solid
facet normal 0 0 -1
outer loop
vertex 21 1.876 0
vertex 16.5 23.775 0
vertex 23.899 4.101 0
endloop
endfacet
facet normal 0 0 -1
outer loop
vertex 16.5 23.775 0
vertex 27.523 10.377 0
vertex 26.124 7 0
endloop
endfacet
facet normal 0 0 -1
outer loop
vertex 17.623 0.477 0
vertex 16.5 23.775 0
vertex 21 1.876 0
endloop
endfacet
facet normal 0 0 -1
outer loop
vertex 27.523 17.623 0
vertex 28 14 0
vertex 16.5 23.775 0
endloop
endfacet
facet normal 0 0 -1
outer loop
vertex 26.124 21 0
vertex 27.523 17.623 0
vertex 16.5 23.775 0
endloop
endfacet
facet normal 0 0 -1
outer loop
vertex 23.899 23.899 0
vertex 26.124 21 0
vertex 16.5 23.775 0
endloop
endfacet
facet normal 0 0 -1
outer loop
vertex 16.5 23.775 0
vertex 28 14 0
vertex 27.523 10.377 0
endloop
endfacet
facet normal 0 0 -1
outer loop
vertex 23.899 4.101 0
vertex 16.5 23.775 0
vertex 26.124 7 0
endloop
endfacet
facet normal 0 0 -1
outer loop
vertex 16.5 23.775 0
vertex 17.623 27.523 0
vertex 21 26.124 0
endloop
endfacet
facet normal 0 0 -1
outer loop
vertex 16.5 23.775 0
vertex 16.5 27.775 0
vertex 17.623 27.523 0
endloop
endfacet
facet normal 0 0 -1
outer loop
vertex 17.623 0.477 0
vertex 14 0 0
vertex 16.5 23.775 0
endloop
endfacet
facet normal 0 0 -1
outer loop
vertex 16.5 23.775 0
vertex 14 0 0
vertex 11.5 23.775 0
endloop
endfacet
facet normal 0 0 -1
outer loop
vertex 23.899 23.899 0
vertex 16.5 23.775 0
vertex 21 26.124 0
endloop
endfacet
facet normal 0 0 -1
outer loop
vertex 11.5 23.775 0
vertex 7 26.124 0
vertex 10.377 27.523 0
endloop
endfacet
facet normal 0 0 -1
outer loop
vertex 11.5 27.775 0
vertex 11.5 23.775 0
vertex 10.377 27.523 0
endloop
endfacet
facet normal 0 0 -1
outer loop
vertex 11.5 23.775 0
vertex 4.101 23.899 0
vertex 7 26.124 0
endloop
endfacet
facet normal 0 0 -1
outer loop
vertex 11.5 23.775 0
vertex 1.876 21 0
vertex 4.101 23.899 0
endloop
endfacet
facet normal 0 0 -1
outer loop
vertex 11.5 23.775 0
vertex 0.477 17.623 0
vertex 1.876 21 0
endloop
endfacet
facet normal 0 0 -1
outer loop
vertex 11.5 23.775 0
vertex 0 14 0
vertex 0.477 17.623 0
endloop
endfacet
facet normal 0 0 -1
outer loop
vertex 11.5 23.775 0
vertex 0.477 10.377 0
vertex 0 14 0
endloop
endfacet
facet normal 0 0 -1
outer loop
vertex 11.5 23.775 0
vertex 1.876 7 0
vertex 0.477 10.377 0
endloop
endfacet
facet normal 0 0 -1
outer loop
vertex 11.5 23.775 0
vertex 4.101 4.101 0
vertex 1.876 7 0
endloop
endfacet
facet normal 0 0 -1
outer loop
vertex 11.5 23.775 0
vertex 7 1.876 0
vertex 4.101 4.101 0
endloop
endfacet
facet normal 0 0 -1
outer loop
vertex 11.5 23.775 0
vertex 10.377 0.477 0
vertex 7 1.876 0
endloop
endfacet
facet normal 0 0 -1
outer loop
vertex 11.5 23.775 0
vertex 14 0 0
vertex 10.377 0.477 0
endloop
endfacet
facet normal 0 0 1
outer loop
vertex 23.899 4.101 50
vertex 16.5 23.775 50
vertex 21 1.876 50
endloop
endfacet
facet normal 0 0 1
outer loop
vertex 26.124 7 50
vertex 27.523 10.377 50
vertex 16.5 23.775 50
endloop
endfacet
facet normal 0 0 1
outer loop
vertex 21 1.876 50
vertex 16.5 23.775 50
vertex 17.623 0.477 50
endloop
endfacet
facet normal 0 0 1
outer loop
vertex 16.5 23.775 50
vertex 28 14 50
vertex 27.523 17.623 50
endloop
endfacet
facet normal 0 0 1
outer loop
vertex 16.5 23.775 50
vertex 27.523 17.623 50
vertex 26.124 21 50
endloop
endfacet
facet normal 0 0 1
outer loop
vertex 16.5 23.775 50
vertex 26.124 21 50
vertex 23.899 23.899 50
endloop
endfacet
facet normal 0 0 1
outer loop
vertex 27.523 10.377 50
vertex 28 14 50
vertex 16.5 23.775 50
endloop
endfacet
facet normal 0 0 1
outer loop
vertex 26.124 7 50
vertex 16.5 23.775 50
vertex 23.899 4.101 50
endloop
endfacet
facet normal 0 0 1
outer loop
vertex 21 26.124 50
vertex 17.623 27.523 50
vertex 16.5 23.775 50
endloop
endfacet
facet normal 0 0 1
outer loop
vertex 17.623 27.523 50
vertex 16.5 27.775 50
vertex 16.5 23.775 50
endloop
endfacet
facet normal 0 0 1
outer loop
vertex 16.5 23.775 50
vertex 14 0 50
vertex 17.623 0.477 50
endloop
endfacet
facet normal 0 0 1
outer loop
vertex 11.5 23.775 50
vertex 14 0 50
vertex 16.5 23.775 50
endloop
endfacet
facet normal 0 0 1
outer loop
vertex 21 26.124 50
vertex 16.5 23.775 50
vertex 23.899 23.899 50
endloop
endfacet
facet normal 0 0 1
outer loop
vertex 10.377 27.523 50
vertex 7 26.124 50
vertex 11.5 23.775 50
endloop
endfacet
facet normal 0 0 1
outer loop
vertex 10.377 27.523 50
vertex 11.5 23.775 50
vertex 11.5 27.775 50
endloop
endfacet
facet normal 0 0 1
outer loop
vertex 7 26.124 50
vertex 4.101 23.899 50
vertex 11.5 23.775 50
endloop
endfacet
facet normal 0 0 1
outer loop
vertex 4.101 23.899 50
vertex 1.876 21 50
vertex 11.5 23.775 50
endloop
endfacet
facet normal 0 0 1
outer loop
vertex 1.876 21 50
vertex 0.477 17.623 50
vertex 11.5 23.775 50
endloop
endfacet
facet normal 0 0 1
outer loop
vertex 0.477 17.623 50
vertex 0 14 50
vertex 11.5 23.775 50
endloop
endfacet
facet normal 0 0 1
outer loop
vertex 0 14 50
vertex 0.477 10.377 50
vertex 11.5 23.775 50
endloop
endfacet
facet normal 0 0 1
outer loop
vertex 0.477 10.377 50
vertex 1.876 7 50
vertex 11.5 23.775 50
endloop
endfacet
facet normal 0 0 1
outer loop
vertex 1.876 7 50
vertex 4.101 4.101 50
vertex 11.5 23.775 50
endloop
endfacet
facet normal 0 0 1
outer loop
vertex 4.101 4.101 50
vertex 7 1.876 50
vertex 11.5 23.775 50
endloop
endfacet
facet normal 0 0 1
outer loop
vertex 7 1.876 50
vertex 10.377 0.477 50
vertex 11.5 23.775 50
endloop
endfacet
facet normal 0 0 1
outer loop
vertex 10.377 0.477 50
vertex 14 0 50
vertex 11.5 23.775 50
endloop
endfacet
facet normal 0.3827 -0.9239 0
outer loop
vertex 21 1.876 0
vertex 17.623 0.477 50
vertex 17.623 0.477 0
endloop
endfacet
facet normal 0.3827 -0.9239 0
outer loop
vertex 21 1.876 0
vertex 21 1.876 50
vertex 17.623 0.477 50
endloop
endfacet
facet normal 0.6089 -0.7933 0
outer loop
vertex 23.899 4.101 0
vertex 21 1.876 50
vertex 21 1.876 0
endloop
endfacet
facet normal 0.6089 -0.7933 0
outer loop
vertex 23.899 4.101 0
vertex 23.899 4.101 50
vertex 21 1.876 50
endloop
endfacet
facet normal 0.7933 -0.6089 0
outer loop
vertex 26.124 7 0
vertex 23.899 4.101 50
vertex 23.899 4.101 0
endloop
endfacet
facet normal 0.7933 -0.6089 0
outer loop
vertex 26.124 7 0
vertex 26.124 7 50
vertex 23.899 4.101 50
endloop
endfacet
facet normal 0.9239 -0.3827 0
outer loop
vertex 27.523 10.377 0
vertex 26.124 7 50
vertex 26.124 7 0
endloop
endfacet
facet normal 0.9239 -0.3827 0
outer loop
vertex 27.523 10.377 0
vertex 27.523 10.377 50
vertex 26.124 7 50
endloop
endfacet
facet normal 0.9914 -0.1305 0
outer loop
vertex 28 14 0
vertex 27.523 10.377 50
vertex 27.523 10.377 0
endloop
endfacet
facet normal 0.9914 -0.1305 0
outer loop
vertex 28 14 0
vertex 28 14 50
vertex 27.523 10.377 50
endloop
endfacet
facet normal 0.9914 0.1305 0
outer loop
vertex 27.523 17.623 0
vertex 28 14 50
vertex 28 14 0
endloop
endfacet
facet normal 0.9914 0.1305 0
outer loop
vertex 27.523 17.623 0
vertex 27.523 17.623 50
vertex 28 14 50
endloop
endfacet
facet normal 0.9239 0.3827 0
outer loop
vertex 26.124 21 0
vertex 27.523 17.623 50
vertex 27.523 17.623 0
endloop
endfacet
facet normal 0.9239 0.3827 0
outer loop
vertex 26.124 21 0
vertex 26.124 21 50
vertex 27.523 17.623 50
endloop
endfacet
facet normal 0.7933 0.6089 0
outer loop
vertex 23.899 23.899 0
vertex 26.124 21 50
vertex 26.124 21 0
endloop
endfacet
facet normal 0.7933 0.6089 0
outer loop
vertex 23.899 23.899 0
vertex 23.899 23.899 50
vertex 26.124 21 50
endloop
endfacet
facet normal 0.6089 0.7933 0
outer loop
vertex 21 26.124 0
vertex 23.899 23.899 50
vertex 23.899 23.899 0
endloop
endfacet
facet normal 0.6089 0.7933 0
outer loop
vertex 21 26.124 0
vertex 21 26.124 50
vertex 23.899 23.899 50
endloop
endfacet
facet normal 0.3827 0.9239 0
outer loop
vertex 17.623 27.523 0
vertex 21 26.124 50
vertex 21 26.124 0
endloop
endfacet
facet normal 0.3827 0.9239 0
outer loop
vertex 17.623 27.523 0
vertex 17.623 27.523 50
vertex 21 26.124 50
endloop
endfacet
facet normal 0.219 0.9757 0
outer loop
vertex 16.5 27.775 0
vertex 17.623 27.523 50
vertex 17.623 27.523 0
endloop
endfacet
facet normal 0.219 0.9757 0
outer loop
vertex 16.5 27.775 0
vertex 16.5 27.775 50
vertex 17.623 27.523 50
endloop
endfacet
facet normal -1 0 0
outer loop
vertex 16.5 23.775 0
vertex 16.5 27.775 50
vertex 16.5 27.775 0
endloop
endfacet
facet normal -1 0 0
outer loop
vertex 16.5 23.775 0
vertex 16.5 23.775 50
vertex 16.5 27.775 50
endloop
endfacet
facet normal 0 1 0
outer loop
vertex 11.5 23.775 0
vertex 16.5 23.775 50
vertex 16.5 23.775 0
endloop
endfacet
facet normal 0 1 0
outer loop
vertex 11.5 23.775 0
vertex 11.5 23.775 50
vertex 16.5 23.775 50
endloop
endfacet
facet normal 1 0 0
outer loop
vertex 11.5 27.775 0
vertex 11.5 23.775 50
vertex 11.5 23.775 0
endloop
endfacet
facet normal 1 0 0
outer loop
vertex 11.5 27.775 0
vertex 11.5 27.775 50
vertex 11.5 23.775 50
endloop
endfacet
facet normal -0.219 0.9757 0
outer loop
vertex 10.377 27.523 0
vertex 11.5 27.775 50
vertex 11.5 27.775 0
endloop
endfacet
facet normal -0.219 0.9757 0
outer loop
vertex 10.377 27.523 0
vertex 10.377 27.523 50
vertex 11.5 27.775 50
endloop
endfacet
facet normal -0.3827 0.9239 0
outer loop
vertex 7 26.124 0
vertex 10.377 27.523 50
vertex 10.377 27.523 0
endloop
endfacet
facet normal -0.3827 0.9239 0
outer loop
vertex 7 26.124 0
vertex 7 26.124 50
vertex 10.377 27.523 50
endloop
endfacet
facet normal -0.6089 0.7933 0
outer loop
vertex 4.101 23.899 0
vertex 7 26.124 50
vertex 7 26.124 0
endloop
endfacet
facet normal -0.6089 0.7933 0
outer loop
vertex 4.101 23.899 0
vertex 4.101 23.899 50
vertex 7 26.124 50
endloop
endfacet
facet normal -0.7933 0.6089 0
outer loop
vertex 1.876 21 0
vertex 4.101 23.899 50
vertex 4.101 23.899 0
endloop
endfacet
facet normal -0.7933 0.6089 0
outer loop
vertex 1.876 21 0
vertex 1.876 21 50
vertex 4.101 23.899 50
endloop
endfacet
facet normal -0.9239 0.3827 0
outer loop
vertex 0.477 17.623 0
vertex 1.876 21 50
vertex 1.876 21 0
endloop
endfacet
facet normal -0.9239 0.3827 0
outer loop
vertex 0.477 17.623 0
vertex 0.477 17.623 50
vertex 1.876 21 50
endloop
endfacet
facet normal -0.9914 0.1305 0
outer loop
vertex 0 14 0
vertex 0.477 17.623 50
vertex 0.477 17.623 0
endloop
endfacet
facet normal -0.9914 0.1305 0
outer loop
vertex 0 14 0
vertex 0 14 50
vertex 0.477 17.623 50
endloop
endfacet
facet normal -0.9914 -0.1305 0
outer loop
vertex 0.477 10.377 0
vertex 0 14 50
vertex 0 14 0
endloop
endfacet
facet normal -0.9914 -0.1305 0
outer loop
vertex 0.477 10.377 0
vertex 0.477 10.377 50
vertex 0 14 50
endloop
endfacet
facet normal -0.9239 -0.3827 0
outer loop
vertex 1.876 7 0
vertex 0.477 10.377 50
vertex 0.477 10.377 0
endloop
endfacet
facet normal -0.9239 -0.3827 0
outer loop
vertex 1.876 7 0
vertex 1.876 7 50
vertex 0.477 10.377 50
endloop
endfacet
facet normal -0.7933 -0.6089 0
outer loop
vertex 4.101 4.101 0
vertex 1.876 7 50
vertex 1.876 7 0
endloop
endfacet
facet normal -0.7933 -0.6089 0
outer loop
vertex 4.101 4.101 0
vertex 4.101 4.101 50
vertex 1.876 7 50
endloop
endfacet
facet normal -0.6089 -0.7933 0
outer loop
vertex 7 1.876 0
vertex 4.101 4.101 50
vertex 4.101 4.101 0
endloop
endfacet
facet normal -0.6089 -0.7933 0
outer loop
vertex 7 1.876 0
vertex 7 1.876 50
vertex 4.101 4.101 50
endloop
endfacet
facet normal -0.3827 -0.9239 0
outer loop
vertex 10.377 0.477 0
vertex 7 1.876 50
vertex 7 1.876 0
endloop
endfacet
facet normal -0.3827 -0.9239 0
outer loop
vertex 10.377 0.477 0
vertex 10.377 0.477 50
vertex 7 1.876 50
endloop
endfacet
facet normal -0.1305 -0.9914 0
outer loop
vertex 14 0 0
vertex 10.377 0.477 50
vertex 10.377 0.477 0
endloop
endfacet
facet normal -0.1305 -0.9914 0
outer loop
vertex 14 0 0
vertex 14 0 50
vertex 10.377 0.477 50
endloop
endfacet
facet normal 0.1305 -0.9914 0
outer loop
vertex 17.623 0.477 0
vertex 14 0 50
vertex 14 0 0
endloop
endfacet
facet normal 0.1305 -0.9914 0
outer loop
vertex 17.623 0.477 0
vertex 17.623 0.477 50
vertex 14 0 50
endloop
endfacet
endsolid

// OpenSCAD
$fn = 32;

// ----------------------------------------------------------------------
// Keyway shaft: d28 shaft, key 5 x 4 mm
// ----------------------------------------------------------------------

// --- parameters (mm) ---
shaft_r = 14;             // shaft radius
key_w = 5;                // keyway width
key_d = 4;                // keyway depth below the surface line
plate_t = 50;             // shaft length, Z (extrusion height)

shaft_d = 2 * shaft_r;  // shaft diameter
circle_step = 15;  // polygon sampling step, degrees

profile = [[10.377, 27.523], [7, 26.124], [4.101, 23.899], [1.876, 21], [0.477, 17.623], [0, 14], [0.477, 10.377], [1.876, 7], [4.101, 4.101], [7, 1.876], [10.377, 0.477], [14, 0], [17.623, 0.477], [21, 1.876], [23.899, 4.101], [26.124, 7], [27.523, 10.377], [28, 14], [27.523, 17.623], [26.124, 21], [23.899, 23.899], [21, 26.124], [17.623, 27.523], [16.5, 27.775], [16.5, 23.775], [11.5, 23.775], [11.5, 27.775]];  // primary outline, 27 points, counter clockwise

// --- the one profile operation ---
linear_extrude(height = plate_t) polygon(points = profile);
